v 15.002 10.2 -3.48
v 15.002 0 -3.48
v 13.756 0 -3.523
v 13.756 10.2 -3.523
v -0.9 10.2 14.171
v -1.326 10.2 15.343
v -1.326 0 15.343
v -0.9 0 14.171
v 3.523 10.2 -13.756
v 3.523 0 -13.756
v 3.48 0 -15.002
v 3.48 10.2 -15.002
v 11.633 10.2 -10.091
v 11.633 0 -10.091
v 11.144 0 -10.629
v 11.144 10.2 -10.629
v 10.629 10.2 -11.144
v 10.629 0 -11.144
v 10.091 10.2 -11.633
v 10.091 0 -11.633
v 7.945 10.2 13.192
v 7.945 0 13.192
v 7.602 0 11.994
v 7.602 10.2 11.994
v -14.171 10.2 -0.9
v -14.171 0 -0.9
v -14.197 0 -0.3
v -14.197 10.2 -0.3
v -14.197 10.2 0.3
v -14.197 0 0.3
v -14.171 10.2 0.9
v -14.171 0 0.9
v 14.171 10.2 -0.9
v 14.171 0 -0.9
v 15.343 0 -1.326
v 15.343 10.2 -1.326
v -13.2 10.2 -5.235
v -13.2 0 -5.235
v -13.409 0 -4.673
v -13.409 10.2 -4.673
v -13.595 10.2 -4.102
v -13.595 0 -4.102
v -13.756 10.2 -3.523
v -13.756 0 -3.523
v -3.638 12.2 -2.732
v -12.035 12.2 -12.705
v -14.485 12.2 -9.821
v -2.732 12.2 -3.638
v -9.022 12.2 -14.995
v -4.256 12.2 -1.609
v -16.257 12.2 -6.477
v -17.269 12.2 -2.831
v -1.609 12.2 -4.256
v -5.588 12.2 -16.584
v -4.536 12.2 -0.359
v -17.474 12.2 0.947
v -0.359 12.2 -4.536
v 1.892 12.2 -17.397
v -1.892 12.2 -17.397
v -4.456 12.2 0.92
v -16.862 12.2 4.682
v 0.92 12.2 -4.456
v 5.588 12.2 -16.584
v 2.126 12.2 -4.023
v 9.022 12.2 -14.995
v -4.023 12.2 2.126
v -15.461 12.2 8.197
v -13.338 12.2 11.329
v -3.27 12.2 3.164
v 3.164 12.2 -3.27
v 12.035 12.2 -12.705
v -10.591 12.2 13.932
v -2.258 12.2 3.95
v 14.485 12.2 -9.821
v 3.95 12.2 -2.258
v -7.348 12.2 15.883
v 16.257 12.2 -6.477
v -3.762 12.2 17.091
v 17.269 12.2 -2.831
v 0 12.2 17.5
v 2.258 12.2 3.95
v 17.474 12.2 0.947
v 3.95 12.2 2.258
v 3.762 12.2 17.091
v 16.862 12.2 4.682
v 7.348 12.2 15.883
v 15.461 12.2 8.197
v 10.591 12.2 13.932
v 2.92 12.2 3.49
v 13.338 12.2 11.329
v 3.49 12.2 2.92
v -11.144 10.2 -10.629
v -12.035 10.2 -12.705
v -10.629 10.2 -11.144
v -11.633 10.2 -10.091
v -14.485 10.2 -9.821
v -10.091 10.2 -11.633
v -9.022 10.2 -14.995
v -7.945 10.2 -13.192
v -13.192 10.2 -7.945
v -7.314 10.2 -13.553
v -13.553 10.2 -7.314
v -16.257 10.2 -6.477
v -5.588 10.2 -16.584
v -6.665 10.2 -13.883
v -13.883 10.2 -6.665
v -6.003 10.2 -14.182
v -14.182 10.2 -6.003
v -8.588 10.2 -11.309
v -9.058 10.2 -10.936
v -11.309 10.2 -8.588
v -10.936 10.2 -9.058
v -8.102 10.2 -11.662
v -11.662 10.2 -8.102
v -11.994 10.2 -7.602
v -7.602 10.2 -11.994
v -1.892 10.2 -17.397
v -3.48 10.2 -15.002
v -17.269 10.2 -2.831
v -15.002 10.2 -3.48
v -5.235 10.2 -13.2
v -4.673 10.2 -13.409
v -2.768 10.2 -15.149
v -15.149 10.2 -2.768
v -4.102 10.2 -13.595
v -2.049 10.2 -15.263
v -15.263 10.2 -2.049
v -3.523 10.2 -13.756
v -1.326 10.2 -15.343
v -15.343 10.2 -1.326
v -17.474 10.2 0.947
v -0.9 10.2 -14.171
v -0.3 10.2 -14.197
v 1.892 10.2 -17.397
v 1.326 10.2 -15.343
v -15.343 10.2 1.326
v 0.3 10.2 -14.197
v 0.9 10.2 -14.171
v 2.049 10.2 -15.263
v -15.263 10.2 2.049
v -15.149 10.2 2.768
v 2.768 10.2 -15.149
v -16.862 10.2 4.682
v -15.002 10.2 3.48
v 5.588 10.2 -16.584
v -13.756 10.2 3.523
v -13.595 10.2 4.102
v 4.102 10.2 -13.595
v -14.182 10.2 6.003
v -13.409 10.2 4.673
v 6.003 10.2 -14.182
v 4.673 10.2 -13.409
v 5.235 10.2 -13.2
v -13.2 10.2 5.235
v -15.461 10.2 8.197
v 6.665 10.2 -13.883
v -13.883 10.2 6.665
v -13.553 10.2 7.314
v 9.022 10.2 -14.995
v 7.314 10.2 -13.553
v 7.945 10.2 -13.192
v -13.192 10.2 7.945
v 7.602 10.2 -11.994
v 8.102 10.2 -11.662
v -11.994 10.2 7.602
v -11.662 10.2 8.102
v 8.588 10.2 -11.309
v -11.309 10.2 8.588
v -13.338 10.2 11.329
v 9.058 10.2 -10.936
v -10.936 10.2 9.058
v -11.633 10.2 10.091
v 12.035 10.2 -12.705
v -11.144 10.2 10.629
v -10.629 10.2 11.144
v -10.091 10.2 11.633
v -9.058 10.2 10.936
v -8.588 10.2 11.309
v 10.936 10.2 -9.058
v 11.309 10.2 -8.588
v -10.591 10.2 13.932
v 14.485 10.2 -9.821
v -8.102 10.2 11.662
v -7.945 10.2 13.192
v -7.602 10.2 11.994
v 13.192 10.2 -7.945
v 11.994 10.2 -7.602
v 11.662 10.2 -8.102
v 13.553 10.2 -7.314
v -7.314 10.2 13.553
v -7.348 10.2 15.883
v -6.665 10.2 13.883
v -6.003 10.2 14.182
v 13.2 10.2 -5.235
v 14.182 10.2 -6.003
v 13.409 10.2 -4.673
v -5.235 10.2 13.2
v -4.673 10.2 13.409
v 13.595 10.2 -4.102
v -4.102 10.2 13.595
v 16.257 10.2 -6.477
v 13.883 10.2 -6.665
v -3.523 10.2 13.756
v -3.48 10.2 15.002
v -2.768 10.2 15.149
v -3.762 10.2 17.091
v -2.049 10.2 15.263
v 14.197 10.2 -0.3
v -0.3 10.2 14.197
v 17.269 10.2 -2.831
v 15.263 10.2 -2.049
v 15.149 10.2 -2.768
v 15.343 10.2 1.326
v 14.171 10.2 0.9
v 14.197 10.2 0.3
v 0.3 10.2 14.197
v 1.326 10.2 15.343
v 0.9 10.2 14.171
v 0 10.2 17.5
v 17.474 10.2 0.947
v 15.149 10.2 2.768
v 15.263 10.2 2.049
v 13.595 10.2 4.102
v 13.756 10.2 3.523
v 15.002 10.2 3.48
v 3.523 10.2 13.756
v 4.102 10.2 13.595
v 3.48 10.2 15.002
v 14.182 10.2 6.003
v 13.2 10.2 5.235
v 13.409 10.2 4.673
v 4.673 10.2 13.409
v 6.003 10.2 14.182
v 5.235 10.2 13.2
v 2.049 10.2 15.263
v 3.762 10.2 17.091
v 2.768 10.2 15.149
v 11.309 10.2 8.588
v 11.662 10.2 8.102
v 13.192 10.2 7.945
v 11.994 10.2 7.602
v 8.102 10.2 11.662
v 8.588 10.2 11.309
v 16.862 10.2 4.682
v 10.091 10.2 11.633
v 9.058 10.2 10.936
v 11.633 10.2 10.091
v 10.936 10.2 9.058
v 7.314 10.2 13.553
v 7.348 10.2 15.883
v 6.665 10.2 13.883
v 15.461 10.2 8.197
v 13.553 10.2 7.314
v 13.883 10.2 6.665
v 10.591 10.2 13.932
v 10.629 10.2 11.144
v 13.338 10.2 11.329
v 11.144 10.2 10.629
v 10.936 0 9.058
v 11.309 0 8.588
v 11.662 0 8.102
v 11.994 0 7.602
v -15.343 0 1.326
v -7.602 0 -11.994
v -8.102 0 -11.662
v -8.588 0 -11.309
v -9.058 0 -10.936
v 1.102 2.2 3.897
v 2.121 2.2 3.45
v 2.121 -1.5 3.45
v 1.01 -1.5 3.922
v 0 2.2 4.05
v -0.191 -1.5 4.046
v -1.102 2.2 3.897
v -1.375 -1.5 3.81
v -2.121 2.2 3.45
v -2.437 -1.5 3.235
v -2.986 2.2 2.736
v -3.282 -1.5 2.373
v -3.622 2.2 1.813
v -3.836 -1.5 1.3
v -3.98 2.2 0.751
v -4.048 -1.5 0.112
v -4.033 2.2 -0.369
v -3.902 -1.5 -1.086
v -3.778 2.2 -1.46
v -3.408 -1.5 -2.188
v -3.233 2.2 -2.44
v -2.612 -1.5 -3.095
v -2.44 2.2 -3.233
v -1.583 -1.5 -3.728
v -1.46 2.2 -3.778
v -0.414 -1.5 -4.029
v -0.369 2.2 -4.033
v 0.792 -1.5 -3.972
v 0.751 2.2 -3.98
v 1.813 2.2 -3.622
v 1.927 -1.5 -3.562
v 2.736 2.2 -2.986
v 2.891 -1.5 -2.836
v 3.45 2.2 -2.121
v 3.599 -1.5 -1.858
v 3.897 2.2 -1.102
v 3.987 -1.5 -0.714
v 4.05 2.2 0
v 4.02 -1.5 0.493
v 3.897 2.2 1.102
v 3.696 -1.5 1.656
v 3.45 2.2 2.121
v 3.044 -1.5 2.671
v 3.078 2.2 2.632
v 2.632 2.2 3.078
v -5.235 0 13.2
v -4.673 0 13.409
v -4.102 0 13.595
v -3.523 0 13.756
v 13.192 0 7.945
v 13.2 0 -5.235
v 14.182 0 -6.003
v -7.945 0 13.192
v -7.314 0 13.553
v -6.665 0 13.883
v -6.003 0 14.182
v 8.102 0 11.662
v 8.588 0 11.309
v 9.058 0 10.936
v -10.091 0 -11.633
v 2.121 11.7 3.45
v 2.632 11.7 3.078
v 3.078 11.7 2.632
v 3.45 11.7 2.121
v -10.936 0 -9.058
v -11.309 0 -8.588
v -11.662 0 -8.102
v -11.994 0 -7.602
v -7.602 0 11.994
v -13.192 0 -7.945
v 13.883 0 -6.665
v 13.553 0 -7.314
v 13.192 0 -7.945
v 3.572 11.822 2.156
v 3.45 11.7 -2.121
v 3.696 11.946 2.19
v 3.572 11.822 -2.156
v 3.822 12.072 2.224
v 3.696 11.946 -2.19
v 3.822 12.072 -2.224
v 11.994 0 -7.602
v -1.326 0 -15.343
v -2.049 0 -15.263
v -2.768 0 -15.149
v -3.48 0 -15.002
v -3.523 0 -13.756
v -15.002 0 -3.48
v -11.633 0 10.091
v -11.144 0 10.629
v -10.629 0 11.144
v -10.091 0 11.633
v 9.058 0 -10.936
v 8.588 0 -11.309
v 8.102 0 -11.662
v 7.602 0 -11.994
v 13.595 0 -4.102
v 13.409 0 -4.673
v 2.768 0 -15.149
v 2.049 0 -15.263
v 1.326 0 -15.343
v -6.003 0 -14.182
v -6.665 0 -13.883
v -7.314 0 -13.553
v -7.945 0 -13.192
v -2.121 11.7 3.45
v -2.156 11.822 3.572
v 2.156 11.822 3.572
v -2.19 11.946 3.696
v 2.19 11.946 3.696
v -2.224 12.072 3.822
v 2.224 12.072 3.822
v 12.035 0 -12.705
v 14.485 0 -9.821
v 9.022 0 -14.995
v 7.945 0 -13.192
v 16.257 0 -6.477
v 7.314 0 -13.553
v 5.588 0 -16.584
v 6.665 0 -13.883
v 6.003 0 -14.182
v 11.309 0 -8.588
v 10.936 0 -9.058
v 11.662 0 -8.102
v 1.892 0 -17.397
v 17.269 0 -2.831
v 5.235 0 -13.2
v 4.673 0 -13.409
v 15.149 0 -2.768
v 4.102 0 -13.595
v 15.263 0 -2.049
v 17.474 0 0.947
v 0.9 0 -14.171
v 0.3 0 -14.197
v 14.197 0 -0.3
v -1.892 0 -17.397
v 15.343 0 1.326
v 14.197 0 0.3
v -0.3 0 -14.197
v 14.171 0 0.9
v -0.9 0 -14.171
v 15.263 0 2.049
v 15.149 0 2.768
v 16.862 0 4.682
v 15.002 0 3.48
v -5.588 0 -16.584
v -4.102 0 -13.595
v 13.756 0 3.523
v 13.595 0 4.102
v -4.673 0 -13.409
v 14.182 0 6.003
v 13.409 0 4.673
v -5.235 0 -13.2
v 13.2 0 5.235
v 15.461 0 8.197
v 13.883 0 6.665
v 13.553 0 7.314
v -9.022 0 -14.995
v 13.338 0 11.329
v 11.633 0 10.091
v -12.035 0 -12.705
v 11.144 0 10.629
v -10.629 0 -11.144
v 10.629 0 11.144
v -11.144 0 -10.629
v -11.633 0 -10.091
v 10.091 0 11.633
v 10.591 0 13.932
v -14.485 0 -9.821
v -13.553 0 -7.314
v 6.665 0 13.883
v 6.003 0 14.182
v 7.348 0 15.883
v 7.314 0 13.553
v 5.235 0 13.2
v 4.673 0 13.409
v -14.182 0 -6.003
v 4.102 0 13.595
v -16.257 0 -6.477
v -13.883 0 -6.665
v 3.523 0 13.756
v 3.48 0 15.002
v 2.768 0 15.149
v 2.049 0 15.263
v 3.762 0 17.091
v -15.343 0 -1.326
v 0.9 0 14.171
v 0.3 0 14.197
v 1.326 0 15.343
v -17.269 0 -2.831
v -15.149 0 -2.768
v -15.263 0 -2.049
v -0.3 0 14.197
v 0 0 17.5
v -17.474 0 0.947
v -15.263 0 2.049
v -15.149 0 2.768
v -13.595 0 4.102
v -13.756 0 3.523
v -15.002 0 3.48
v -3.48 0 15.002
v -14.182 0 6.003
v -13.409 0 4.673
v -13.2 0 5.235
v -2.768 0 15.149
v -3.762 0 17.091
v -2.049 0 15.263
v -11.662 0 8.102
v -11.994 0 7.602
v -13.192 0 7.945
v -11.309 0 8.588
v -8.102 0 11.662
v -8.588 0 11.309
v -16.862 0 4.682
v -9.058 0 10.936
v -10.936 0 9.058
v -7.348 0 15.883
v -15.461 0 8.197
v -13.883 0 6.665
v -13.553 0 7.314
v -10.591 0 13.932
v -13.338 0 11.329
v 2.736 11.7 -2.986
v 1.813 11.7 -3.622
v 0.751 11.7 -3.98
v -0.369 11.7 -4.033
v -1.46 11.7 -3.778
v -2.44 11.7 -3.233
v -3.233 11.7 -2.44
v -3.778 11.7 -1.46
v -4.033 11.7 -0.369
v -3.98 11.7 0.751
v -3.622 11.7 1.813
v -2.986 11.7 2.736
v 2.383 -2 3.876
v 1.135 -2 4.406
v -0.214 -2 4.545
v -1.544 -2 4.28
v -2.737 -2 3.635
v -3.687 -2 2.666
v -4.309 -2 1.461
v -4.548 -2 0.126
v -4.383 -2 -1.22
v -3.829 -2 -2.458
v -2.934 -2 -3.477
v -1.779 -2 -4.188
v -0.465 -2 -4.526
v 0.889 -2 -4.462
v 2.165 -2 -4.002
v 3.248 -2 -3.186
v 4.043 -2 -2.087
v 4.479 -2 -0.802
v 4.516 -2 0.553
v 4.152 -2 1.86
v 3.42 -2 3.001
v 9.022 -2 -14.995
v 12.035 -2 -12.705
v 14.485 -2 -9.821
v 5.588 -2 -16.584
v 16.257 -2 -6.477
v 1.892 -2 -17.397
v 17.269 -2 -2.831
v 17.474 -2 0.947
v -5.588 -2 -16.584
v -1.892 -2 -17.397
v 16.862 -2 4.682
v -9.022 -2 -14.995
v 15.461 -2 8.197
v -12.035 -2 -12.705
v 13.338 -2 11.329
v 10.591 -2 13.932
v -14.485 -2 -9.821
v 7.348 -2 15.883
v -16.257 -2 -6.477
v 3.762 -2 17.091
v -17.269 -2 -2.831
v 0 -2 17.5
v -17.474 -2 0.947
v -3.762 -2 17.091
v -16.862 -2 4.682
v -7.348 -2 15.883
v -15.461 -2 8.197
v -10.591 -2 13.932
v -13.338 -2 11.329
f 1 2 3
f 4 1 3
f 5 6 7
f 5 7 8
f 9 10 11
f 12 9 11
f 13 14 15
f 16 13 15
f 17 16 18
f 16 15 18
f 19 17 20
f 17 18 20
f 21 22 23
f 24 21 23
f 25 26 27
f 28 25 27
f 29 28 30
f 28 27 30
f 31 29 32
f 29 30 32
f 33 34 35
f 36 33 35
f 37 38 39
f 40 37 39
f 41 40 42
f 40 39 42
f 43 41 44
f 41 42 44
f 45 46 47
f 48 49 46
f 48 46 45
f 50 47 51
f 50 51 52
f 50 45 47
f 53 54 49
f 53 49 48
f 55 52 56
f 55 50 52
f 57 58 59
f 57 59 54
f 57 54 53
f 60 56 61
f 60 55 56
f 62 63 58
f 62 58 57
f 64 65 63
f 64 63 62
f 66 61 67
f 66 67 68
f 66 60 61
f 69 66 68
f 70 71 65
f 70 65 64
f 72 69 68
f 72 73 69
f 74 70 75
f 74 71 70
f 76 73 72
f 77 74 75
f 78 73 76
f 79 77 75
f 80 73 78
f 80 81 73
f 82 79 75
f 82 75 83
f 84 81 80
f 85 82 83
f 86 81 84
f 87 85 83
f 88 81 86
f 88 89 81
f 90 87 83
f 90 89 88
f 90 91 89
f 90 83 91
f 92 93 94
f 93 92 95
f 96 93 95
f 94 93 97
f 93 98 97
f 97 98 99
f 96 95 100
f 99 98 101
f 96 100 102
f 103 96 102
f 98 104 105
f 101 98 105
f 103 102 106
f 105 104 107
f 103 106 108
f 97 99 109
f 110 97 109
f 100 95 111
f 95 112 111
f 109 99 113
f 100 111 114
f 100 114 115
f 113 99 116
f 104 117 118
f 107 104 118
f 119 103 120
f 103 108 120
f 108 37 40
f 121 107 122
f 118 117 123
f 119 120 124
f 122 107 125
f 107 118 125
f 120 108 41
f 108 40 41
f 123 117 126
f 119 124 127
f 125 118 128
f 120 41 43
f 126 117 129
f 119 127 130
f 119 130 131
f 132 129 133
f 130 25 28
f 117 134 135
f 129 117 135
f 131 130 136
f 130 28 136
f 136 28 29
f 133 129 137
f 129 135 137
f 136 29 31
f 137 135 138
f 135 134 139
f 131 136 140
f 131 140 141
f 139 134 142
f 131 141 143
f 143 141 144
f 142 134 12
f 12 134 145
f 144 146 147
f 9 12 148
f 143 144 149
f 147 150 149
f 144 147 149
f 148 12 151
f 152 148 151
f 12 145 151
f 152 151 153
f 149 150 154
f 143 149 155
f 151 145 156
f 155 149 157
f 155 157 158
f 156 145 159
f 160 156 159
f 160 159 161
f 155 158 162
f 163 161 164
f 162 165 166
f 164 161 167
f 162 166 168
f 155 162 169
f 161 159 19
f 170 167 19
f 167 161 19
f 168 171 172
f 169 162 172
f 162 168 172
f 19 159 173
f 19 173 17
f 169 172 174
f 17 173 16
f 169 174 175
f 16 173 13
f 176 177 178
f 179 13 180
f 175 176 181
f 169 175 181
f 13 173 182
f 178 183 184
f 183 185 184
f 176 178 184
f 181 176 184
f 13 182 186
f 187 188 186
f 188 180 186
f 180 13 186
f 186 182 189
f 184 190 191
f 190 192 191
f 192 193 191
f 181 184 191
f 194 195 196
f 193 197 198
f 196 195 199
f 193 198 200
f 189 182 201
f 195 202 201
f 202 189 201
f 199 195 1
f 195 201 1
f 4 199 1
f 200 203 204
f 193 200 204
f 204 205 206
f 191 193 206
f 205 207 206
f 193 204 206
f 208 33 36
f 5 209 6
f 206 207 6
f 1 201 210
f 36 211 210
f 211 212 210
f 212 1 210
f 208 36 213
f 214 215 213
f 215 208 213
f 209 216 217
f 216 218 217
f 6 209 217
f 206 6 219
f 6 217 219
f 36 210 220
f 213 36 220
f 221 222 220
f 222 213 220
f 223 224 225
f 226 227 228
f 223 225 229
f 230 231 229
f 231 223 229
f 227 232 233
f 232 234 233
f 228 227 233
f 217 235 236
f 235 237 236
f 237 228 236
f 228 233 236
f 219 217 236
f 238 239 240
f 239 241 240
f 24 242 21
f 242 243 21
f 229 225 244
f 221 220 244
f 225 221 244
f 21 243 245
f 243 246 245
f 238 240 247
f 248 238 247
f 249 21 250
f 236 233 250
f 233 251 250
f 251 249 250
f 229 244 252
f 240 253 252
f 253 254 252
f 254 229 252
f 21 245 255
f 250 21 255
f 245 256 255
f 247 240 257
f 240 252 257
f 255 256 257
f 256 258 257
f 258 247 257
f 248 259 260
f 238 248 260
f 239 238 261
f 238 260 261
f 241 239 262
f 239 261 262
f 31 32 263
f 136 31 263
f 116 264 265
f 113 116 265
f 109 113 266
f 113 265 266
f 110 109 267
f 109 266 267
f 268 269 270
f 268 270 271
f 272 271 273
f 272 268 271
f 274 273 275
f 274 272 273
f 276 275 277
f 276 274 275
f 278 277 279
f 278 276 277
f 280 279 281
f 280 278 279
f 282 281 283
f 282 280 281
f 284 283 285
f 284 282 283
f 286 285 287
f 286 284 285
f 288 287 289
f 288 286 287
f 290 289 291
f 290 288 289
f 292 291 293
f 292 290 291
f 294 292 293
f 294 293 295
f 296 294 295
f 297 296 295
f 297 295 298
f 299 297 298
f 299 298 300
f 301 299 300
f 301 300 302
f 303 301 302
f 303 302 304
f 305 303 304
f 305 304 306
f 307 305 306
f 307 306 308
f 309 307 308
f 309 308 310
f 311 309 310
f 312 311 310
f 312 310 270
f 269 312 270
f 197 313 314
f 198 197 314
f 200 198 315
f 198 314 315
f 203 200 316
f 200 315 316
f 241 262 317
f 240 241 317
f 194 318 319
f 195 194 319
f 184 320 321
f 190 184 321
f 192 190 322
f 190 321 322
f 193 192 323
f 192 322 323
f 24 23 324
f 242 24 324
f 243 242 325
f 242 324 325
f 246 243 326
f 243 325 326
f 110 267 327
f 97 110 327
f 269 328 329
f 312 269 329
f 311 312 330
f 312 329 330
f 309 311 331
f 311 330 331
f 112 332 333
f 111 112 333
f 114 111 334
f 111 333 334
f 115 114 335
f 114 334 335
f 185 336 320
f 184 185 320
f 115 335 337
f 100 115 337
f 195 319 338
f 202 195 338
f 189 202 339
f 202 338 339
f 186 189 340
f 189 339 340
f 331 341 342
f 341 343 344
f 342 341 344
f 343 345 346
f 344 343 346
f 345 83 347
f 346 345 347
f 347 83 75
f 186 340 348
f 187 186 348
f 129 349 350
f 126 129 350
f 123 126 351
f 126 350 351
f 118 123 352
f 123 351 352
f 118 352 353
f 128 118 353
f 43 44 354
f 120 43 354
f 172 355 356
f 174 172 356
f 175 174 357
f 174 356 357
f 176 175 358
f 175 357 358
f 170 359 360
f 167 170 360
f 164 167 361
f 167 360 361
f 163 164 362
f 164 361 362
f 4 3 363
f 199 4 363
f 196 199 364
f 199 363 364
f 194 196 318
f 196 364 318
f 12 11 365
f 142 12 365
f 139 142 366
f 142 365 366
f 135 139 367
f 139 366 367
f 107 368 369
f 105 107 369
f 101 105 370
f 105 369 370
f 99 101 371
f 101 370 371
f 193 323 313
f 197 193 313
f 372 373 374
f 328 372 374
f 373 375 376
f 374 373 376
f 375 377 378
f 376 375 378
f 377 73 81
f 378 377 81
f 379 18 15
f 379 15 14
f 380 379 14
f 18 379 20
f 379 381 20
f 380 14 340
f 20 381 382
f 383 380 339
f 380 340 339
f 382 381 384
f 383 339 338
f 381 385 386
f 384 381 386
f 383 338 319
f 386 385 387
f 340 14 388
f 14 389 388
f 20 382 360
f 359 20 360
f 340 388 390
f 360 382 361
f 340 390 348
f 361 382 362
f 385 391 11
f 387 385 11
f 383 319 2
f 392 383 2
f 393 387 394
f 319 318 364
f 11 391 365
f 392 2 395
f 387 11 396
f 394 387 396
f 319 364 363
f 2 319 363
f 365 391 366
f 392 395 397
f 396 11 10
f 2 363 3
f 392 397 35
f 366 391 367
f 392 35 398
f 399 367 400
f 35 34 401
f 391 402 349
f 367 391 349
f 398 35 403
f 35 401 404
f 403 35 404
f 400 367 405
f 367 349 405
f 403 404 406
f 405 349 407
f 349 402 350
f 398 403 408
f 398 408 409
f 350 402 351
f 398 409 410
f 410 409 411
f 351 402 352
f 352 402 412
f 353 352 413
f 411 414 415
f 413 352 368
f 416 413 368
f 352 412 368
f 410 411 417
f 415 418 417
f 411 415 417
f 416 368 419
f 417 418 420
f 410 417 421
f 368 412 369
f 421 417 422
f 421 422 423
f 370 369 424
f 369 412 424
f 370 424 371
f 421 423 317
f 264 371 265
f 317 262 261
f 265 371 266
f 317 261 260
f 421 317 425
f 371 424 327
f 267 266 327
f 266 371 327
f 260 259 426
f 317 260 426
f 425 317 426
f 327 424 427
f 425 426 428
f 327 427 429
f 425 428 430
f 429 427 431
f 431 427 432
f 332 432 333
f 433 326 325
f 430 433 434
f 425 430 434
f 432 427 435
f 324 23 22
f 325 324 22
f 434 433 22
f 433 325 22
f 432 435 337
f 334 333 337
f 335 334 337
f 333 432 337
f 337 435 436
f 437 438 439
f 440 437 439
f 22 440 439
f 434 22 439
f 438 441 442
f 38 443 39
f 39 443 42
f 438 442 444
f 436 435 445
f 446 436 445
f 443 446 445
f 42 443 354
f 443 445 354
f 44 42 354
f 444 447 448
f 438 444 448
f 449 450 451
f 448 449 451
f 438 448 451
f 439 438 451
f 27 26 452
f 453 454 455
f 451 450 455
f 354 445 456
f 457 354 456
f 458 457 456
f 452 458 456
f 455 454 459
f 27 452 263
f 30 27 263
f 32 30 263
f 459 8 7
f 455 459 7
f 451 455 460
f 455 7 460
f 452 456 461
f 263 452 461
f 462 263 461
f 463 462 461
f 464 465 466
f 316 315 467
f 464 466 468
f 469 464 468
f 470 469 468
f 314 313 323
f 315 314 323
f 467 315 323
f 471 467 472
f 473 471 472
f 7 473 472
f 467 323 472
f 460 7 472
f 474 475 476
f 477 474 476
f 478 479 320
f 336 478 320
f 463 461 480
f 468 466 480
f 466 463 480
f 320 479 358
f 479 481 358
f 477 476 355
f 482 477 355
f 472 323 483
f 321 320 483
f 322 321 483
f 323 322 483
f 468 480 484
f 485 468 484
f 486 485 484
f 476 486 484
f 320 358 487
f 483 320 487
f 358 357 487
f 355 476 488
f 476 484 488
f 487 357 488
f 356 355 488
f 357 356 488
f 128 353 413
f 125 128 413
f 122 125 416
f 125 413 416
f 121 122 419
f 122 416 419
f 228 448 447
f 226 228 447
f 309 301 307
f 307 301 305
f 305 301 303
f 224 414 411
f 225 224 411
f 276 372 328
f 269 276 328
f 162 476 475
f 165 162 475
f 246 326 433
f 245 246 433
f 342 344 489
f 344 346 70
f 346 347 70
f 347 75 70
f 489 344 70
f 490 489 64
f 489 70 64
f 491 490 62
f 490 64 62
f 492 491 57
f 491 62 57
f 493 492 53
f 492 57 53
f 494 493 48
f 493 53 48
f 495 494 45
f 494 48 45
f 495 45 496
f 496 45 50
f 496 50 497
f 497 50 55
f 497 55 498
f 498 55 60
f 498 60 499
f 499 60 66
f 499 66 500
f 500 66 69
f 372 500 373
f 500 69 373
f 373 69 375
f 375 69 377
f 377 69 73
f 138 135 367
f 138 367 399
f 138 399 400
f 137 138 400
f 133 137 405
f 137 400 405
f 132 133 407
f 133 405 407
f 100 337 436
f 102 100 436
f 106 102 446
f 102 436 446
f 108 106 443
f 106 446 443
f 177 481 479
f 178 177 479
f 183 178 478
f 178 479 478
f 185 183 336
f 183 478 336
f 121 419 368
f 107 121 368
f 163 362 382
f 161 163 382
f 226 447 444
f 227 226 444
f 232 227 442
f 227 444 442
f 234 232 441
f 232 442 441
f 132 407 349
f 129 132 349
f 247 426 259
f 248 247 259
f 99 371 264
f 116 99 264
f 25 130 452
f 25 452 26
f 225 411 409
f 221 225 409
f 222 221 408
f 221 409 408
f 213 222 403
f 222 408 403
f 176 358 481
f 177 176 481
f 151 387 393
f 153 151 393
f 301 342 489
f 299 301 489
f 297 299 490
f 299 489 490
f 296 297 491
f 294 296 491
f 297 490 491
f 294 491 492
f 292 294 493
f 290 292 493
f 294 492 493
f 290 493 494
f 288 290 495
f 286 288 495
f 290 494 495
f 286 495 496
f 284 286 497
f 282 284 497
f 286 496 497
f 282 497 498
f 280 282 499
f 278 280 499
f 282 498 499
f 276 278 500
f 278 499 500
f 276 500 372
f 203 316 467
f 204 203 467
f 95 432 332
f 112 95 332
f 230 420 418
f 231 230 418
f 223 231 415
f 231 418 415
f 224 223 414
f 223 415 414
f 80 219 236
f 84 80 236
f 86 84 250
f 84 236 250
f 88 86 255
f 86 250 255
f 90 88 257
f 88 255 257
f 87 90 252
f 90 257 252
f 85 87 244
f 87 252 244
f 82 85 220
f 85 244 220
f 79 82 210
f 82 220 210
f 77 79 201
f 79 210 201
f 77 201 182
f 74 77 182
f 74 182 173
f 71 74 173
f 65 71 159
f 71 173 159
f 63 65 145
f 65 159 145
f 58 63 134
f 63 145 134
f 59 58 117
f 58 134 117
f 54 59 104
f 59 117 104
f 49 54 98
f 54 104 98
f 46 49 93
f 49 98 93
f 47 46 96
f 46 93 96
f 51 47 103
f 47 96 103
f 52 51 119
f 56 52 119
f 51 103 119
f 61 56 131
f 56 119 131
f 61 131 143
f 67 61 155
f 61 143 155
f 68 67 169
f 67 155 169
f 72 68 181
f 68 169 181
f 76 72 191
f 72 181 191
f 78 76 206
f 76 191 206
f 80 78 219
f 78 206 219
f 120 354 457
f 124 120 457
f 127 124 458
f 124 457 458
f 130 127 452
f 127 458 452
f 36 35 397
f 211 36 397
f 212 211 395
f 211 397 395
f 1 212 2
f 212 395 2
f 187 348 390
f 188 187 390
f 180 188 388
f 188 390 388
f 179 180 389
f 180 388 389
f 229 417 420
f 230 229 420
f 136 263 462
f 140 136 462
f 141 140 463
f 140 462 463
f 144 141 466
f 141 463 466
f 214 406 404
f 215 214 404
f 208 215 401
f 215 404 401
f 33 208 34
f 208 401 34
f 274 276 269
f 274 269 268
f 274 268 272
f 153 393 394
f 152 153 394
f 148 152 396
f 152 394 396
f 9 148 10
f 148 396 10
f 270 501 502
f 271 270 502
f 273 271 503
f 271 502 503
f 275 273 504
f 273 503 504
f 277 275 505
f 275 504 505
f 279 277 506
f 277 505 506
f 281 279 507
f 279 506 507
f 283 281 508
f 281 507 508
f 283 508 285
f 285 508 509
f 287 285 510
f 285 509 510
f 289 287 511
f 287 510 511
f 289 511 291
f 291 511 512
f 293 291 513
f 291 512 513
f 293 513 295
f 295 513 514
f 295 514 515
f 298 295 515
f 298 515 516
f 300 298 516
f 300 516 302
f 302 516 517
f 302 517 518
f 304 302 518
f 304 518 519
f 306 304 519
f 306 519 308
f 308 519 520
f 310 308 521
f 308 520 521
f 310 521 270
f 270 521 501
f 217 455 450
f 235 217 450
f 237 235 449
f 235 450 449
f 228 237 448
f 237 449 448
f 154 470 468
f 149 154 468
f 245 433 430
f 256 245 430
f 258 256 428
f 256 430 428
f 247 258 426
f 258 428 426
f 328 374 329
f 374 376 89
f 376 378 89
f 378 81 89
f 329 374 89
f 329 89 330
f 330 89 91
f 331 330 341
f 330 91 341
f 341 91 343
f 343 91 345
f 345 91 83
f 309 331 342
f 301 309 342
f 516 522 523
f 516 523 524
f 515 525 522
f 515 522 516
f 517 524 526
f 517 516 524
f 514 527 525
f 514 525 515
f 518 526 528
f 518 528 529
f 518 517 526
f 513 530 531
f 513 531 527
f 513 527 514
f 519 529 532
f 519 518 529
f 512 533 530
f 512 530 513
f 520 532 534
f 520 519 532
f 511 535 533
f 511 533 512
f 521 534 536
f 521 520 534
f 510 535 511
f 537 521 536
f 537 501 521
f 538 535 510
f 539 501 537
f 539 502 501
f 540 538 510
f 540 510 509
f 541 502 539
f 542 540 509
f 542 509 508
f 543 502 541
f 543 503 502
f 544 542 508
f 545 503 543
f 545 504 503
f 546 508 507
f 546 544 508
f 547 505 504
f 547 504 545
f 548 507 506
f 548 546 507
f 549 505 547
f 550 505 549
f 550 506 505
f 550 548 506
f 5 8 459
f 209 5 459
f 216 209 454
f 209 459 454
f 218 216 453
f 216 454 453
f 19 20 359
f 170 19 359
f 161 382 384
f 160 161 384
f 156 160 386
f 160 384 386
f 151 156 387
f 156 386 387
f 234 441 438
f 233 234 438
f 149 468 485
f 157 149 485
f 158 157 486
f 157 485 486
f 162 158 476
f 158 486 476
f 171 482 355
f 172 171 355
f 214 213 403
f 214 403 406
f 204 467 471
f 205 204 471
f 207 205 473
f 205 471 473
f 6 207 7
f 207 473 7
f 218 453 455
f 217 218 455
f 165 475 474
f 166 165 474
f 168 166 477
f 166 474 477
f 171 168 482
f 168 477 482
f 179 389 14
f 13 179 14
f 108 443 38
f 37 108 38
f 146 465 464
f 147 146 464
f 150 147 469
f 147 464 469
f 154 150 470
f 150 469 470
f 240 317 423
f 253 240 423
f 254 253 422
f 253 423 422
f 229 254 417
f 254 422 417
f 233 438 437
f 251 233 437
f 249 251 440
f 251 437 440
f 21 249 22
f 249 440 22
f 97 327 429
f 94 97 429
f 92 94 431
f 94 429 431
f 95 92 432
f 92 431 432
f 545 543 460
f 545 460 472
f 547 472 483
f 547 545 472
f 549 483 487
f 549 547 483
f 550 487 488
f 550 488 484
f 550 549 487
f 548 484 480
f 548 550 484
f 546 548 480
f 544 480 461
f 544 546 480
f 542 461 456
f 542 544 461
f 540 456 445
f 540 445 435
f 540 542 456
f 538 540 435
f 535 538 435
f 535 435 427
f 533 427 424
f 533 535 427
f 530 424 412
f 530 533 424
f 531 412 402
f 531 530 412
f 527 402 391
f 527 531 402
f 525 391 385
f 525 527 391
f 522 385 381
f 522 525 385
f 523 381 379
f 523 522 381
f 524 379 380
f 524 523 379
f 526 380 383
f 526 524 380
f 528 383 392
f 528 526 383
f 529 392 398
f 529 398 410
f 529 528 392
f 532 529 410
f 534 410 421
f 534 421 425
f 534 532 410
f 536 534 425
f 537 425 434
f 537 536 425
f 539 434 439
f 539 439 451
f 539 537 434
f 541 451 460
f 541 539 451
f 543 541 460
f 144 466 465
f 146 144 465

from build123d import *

# Parameters (mm, degrees)
EXTRUDE_1_DEPTH     = 10.2
SKETCH_3_R          = 17.5
EXTRUDE_2_DEPTH     = 2
EXTRUDE_START       = 2
SKETCH_4_R          = 17.5
EXTRUDE_3_DEPTH     = 2
CUT_EXTRUDE_4_DEPTH = 10
CUT_EXTRUDE_START   = -4.2
SKETCH_6_R          = 4.05
CUT_EXTRUDE_5_DEPTH = 4.2
CHAMFER_1_SIZE      = 0.5
CHAMFER_2_SIZE      = 0.5


with BuildPart() as part:
    # Эскиз2 → Вытянуть1 (new body)
    with BuildSketch(Plane(origin=(0, 0, 0), x_dir=(1, 0, 0), z_dir=(0, 1, 0))):
        with BuildLine():
            Line((-0.9, 14.171450173), (-1.326328648, 15.342778507))
            ThreePointArc((-1.326328648, 15.342778507), (-2.409090762, 15.210400445), (-3.479765796, 15.00170757))
            Line((-3.479765796, 15.00170757), (-3.523268074, 13.755965327))
            ThreePointArc((-3.523268074, 13.755965327), (-4.38804132, 13.505002531), (-5.235169803, 13.199734737))
            Line((-5.235169803, 13.199734737), (-6.002592803, 14.181991385))
            ThreePointArc((-6.002592803, 14.181991385), (-6.991453696, 13.721500473), (-7.945236519, 13.192164972))
            Line((-7.945236519, 13.192164972), (-7.60165412, 11.993950752))
            ThreePointArc((-7.60165412, 11.993950752), (-8.346550583, 11.48804132), (-9.05788471, 10.935937298))
            Line((-9.05788471, 10.935937298), (-10.091281352, 11.632972134))
            ThreePointArc((-10.091281352, 11.632972134), (-10.88944443, 10.88944443), (-11.632972134, 10.091281352))
            Line((-11.632972134, 10.091281352), (-10.935937298, 9.05788471))
            ThreePointArc((-10.935937298, 9.05788471), (-11.48804132, 8.346550583), (-11.993950752, 7.60165412))
            Line((-11.993950752, 7.60165412), (-13.192164972, 7.945236519))
            ThreePointArc((-13.192164972, 7.945236519), (-13.721500473, 6.991453696), (-14.181991385, 6.002592803))
            Line((-14.181991385, 6.002592803), (-13.199734737, 5.235169803))
            ThreePointArc((-13.199734737, 5.235169803), (-13.505002531, 4.38804132), (-13.755965327, 3.523268074))
            Line((-13.755965327, 3.523268074), (-15.00170757, 3.479765796))
            ThreePointArc((-15.00170757, 3.479765796), (-15.210400445, 2.409090762), (-15.342778507, 1.326328648))
            Line((-15.342778507, 1.326328648), (-14.171450173, 0.9))
            ThreePointArc((-14.171450173, 0.9), (-14.2, 0), (-14.171450173, -0.9))
            Line((-14.171450173, -0.9), (-15.342778507, -1.326328648))
            ThreePointArc((-15.342778507, -1.326328648), (-15.210400445, -2.409090762), (-15.00170757, -3.479765796))
            Line((-15.00170757, -3.479765796), (-13.755965327, -3.523268074))
            ThreePointArc((-13.755965327, -3.523268074), (-13.505002531, -4.38804132), (-13.199734737, -5.235169803))
            Line((-13.199734737, -5.235169803), (-14.181991385, -6.002592803))
            ThreePointArc((-14.181991385, -6.002592803), (-13.721500473, -6.991453696), (-13.192164972, -7.945236519))
            Line((-13.192164972, -7.945236519), (-11.993950752, -7.60165412))
            ThreePointArc((-11.993950752, -7.60165412), (-11.48804132, -8.346550583), (-10.935937298, -9.05788471))
            Line((-10.935937298, -9.05788471), (-11.632972134, -10.091281352))
            ThreePointArc((-11.632972134, -10.091281352), (-10.88944443, -10.88944443), (-10.091281352, -11.632972134))
            Line((-10.091281352, -11.632972134), (-9.05788471, -10.935937298))
            ThreePointArc((-9.05788471, -10.935937298), (-8.346550583, -11.48804132), (-7.60165412, -11.993950752))
            Line((-7.60165412, -11.993950752), (-7.945236519, -13.192164972))
            ThreePointArc((-7.945236519, -13.192164972), (-6.991453696, -13.721500473), (-6.002592803, -14.181991385))
            Line((-6.002592803, -14.181991385), (-5.235169803, -13.199734737))
            ThreePointArc((-5.235169803, -13.199734737), (-4.38804132, -13.505002531), (-3.523268074, -13.755965327))
            Line((-3.523268074, -13.755965327), (-3.479765796, -15.00170757))
            ThreePointArc((-3.479765796, -15.00170757), (-2.409090762, -15.210400445), (-1.326328648, -15.342778507))
            Line((-1.326328648, -15.342778507), (-0.9, -14.171450173))
            ThreePointArc((-0.9, -14.171450173), (0, -14.2), (0.9, -14.171450173))
            Line((0.9, -14.171450173), (1.326328648, -15.342778507))
            ThreePointArc((1.326328648, -15.342778507), (2.409090762, -15.210400445), (3.479765796, -15.00170757))
            Line((3.479765796, -15.00170757), (3.523268074, -13.755965327))
            ThreePointArc((3.523268074, -13.755965327), (4.38804132, -13.505002531), (5.235169803, -13.199734737))
            Line((5.235169803, -13.199734737), (6.002592803, -14.181991385))
            ThreePointArc((6.002592803, -14.181991385), (6.991453696, -13.721500473), (7.945236519, -13.192164972))
            Line((7.945236519, -13.192164972), (7.60165412, -11.993950752))
            ThreePointArc((7.60165412, -11.993950752), (8.346550583, -11.48804132), (9.05788471, -10.935937298))
            Line((9.05788471, -10.935937298), (10.091281352, -11.632972134))
            ThreePointArc((10.091281352, -11.632972134), (10.88944443, -10.88944443), (11.632972134, -10.091281352))
            Line((11.632972134, -10.091281352), (10.935937298, -9.05788471))
            ThreePointArc((10.935937298, -9.05788471), (11.48804132, -8.346550583), (11.993950752, -7.60165412))
            Line((11.993950752, -7.60165412), (13.192164972, -7.945236519))
            ThreePointArc((13.192164972, -7.945236519), (13.721500473, -6.991453696), (14.181991385, -6.002592803))
            Line((14.181991385, -6.002592803), (13.199734737, -5.235169803))
            ThreePointArc((13.199734737, -5.235169803), (13.505002531, -4.38804132), (13.755965327, -3.523268074))
            Line((13.755965327, -3.523268074), (15.00170757, -3.479765796))
            ThreePointArc((15.00170757, -3.479765796), (15.210400445, -2.409090762), (15.342778507, -1.326328648))
            Line((15.342778507, -1.326328648), (14.171450173, -0.9))
            ThreePointArc((14.171450173, -0.9), (14.2, 0), (14.171450173, 0.9))
            Line((14.171450173, 0.9), (15.342778507, 1.326328648))
            ThreePointArc((15.342778507, 1.326328648), (15.210400445, 2.409090762), (15.00170757, 3.479765796))
            Line((15.00170757, 3.479765796), (13.755965327, 3.523268074))
            ThreePointArc((13.755965327, 3.523268074), (13.505002531, 4.38804132), (13.199734737, 5.235169803))
            Line((13.199734737, 5.235169803), (14.181991385, 6.002592803))
            ThreePointArc((14.181991385, 6.002592803), (13.721500473, 6.991453696), (13.192164972, 7.945236519))
            Line((13.192164972, 7.945236519), (11.993950752, 7.60165412))
            ThreePointArc((11.993950752, 7.60165412), (11.48804132, 8.346550583), (10.935937298, 9.05788471))
            Line((10.935937298, 9.05788471), (11.632972134, 10.091281352))
            ThreePointArc((11.632972134, 10.091281352), (10.88944443, 10.88944443), (10.091281352, 11.632972134))
            Line((10.091281352, 11.632972134), (9.05788471, 10.935937298))
            ThreePointArc((9.05788471, 10.935937298), (8.346550583, 11.48804132), (7.60165412, 11.993950752))
            Line((7.60165412, 11.993950752), (7.945236519, 13.192164972))
            ThreePointArc((7.945236519, 13.192164972), (6.991453696, 13.721500473), (6.002592803, 14.181991385))
            Line((6.002592803, 14.181991385), (5.235169803, 13.199734737))
            ThreePointArc((5.235169803, 13.199734737), (4.38804132, 13.505002531), (3.523268074, 13.755965327))
            Line((3.523268074, 13.755965327), (3.479765796, 15.00170757))
            ThreePointArc((3.479765796, 15.00170757), (2.409090762, 15.210400445), (1.326328648, 15.342778507))
            Line((1.326328648, 15.342778507), (0.9, 14.171450173))
            ThreePointArc((0.9, 14.171450173), (0, 14.2), (-0.9, 14.171450173))
        make_face()
    extrude(amount=EXTRUDE_1_DEPTH)

    # Эскиз3 → Вытянуть2 (add)
    with BuildSketch(Plane(origin=(0, 10.2, 0), x_dir=(1, 0, 0), z_dir=(0, 1, 0))):
        with Locations(Location((0, 0, 0), (0, 0, 270))):
            Circle(SKETCH_3_R)
    extrude(amount=EXTRUDE_2_DEPTH)

    # Эскиз4 → Вытянуть3 (add)
    with BuildSketch(Plane.XZ.offset(EXTRUDE_START)):
        with Locations(Location((0, 0, 0), (0, 0, 90))):
            Circle(SKETCH_4_R)
    extrude(amount=-EXTRUDE_3_DEPTH)

    # Эскиз5 → Вытянуть4 (cut)
    with BuildSketch(Plane(origin=(0, 12.2, 0), x_dir=(1, 0, 0), z_dir=(0, 1, 0))):
        with BuildLine():
            Line((3.45, -2.121320344), (3.45, 2.121320344))
            ThreePointArc((3.45, 2.121320344), (-2.863782464, 2.863782464), (-2.121320344, -3.45))
            Line((-2.121320344, -3.45), (2.121320344, -3.45))
            ThreePointArc((2.121320344, -3.45), (2.863782464, -2.863782464), (3.45, -2.121320344))
        make_face()
    extrude(amount=-CUT_EXTRUDE_4_DEPTH, mode=Mode.SUBTRACT)

    # Эскиз6 → Вытянуть5 (cut)
    with BuildSketch(Plane.XZ.offset(2).offset(CUT_EXTRUDE_START)):
        with Locations(Location((0, 0, 0), (0, 0, 58.413661903))):
            Circle(SKETCH_6_R)
    extrude(amount=CUT_EXTRUDE_5_DEPTH, mode=Mode.SUBTRACT)

    # Фаска1
    chamfer_1_edges = [part.edges().sort_by_distance(p)[0] for p in [
        (-2.863782464, 12.2, -2.863782464),
        (0, 12.2, 3.45),
        (2.863782464, 12.2, 2.863782464),
        (3.45, 12.2, 0),
    ]]
    chamfer(chamfer_1_edges, length=CHAMFER_1_SIZE)

    # Фаска2
    chamfer_2_edges = [part.edges().sort_by_distance(p)[0] for p in [
        (-2.121320344, -2, -3.45),
    ]]
    chamfer(chamfer_2_edges, length=CHAMFER_2_SIZE)


solid = part.part
